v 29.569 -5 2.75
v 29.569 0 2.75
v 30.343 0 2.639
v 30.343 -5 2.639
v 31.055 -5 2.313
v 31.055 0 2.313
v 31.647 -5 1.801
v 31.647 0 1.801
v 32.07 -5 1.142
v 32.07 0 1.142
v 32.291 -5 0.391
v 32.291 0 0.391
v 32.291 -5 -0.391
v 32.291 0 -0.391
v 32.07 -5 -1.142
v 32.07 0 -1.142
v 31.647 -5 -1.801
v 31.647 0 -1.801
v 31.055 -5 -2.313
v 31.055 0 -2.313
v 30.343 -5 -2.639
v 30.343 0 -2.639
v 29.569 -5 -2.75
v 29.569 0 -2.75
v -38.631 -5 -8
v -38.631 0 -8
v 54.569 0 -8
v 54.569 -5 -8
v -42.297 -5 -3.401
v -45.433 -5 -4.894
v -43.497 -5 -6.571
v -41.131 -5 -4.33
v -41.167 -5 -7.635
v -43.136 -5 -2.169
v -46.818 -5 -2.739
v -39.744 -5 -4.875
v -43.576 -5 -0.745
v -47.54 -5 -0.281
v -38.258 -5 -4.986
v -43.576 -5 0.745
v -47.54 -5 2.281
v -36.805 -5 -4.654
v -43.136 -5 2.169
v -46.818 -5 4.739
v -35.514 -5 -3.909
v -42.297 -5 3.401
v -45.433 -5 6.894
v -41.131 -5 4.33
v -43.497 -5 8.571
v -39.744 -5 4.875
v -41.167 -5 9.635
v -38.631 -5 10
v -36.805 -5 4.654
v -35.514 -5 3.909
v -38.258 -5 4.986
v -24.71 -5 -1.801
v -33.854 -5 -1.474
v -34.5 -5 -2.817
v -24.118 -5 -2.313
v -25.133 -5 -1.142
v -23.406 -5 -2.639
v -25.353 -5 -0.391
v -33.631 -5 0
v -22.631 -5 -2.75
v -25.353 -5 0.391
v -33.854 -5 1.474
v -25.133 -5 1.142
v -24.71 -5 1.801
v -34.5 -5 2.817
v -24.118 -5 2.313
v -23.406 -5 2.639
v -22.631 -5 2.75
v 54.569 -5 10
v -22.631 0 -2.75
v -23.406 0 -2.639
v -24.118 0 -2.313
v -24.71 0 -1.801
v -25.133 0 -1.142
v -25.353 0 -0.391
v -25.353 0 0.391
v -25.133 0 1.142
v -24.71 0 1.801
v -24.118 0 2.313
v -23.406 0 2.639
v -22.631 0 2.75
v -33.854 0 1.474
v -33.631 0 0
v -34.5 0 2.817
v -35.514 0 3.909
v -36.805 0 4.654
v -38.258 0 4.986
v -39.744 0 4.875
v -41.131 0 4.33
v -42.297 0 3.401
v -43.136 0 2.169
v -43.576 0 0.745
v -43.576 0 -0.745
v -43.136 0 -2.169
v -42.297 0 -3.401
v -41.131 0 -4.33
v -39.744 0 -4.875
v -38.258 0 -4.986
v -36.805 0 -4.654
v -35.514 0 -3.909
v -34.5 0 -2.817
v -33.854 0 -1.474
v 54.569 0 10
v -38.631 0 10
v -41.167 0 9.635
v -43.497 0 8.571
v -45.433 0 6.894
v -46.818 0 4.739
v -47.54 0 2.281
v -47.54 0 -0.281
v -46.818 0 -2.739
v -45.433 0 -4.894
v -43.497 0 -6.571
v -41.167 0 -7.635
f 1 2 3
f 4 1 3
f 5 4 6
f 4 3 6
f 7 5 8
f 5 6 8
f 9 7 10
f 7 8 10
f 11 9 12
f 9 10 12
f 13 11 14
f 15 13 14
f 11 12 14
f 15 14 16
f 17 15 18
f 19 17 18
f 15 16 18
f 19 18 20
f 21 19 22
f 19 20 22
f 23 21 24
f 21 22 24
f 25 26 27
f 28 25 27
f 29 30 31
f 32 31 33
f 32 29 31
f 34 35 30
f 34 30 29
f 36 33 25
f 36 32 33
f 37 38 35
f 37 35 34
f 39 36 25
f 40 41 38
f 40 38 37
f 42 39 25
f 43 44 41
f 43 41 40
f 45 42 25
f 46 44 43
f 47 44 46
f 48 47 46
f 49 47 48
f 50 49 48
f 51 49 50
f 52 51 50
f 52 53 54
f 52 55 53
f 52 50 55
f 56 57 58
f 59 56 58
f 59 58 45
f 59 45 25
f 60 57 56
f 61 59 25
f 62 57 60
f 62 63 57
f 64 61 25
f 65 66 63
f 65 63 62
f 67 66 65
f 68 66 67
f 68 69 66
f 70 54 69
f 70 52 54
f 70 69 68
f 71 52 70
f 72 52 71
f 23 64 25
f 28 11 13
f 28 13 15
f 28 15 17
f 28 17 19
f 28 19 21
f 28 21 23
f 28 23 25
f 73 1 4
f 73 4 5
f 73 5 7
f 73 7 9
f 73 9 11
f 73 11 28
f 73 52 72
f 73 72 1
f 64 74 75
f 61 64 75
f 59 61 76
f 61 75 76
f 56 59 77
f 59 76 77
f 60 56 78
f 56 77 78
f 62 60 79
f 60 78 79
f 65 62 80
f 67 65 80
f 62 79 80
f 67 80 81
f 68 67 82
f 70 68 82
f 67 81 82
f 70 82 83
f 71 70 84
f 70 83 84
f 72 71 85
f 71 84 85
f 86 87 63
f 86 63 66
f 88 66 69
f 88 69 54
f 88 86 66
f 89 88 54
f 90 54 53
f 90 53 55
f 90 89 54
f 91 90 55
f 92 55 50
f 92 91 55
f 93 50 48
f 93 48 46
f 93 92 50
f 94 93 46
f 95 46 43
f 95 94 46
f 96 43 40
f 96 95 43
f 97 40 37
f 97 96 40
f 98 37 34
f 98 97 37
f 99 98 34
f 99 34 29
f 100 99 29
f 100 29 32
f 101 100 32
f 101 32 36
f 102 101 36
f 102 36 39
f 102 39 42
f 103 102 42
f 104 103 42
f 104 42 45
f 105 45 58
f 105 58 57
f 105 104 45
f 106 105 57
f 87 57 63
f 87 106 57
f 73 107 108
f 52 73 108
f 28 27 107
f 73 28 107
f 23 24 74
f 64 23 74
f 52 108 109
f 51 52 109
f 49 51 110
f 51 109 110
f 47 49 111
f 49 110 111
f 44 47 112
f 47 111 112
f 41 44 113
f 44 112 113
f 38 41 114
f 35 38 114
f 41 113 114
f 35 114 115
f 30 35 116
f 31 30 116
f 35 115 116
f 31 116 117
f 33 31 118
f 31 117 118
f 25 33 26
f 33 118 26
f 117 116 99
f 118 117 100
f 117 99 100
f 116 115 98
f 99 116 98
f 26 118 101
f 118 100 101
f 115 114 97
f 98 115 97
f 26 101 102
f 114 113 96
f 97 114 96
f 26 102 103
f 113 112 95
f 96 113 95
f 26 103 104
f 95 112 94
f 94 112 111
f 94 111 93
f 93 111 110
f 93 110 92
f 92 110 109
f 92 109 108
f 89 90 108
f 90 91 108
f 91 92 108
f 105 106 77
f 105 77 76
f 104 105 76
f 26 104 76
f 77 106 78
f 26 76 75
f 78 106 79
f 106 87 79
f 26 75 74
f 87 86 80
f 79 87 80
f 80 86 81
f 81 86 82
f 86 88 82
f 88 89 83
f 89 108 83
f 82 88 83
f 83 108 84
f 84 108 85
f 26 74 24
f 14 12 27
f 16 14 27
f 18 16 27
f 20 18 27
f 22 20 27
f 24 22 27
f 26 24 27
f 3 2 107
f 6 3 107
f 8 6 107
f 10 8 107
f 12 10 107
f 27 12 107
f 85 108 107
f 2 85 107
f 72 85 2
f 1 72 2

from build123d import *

# Parameters (mm, degrees)
F0_R     = 5
F1_DEPTH = 5


with BuildPart() as f1:
    # F0 (on Front) → F1 (new body)
    with BuildSketch(Plane.XZ):
        with BuildLine():
            Line((54.568551, 10), (-38.631449, 10))
            ThreePointArc((-38.631449, 10), (-47.631449, 1), (-38.631449, -8))
            Line((-38.631449, -8), (54.568551, -8))
            Line((54.568551, -8), (54.568551, 10))
        make_face()
        with Locations((-38.631449, 0)):
            Circle(F0_R, mode=Mode.SUBTRACT)
        with BuildLine():
            ThreePointArc((29.568551, 2.75), (32.318551, 0), (29.568551, -2.75))
            Line((29.568551, -2.75), (-22.631449, -2.75))
            ThreePointArc((-22.631449, -2.75), (-25.381449, 0), (-22.631449, 2.75))
            Line((-22.631449, 2.75), (29.568551, 2.75))
        make_face(mode=Mode.SUBTRACT)
    extrude(amount=F1_DEPTH)


solid = f1.part
